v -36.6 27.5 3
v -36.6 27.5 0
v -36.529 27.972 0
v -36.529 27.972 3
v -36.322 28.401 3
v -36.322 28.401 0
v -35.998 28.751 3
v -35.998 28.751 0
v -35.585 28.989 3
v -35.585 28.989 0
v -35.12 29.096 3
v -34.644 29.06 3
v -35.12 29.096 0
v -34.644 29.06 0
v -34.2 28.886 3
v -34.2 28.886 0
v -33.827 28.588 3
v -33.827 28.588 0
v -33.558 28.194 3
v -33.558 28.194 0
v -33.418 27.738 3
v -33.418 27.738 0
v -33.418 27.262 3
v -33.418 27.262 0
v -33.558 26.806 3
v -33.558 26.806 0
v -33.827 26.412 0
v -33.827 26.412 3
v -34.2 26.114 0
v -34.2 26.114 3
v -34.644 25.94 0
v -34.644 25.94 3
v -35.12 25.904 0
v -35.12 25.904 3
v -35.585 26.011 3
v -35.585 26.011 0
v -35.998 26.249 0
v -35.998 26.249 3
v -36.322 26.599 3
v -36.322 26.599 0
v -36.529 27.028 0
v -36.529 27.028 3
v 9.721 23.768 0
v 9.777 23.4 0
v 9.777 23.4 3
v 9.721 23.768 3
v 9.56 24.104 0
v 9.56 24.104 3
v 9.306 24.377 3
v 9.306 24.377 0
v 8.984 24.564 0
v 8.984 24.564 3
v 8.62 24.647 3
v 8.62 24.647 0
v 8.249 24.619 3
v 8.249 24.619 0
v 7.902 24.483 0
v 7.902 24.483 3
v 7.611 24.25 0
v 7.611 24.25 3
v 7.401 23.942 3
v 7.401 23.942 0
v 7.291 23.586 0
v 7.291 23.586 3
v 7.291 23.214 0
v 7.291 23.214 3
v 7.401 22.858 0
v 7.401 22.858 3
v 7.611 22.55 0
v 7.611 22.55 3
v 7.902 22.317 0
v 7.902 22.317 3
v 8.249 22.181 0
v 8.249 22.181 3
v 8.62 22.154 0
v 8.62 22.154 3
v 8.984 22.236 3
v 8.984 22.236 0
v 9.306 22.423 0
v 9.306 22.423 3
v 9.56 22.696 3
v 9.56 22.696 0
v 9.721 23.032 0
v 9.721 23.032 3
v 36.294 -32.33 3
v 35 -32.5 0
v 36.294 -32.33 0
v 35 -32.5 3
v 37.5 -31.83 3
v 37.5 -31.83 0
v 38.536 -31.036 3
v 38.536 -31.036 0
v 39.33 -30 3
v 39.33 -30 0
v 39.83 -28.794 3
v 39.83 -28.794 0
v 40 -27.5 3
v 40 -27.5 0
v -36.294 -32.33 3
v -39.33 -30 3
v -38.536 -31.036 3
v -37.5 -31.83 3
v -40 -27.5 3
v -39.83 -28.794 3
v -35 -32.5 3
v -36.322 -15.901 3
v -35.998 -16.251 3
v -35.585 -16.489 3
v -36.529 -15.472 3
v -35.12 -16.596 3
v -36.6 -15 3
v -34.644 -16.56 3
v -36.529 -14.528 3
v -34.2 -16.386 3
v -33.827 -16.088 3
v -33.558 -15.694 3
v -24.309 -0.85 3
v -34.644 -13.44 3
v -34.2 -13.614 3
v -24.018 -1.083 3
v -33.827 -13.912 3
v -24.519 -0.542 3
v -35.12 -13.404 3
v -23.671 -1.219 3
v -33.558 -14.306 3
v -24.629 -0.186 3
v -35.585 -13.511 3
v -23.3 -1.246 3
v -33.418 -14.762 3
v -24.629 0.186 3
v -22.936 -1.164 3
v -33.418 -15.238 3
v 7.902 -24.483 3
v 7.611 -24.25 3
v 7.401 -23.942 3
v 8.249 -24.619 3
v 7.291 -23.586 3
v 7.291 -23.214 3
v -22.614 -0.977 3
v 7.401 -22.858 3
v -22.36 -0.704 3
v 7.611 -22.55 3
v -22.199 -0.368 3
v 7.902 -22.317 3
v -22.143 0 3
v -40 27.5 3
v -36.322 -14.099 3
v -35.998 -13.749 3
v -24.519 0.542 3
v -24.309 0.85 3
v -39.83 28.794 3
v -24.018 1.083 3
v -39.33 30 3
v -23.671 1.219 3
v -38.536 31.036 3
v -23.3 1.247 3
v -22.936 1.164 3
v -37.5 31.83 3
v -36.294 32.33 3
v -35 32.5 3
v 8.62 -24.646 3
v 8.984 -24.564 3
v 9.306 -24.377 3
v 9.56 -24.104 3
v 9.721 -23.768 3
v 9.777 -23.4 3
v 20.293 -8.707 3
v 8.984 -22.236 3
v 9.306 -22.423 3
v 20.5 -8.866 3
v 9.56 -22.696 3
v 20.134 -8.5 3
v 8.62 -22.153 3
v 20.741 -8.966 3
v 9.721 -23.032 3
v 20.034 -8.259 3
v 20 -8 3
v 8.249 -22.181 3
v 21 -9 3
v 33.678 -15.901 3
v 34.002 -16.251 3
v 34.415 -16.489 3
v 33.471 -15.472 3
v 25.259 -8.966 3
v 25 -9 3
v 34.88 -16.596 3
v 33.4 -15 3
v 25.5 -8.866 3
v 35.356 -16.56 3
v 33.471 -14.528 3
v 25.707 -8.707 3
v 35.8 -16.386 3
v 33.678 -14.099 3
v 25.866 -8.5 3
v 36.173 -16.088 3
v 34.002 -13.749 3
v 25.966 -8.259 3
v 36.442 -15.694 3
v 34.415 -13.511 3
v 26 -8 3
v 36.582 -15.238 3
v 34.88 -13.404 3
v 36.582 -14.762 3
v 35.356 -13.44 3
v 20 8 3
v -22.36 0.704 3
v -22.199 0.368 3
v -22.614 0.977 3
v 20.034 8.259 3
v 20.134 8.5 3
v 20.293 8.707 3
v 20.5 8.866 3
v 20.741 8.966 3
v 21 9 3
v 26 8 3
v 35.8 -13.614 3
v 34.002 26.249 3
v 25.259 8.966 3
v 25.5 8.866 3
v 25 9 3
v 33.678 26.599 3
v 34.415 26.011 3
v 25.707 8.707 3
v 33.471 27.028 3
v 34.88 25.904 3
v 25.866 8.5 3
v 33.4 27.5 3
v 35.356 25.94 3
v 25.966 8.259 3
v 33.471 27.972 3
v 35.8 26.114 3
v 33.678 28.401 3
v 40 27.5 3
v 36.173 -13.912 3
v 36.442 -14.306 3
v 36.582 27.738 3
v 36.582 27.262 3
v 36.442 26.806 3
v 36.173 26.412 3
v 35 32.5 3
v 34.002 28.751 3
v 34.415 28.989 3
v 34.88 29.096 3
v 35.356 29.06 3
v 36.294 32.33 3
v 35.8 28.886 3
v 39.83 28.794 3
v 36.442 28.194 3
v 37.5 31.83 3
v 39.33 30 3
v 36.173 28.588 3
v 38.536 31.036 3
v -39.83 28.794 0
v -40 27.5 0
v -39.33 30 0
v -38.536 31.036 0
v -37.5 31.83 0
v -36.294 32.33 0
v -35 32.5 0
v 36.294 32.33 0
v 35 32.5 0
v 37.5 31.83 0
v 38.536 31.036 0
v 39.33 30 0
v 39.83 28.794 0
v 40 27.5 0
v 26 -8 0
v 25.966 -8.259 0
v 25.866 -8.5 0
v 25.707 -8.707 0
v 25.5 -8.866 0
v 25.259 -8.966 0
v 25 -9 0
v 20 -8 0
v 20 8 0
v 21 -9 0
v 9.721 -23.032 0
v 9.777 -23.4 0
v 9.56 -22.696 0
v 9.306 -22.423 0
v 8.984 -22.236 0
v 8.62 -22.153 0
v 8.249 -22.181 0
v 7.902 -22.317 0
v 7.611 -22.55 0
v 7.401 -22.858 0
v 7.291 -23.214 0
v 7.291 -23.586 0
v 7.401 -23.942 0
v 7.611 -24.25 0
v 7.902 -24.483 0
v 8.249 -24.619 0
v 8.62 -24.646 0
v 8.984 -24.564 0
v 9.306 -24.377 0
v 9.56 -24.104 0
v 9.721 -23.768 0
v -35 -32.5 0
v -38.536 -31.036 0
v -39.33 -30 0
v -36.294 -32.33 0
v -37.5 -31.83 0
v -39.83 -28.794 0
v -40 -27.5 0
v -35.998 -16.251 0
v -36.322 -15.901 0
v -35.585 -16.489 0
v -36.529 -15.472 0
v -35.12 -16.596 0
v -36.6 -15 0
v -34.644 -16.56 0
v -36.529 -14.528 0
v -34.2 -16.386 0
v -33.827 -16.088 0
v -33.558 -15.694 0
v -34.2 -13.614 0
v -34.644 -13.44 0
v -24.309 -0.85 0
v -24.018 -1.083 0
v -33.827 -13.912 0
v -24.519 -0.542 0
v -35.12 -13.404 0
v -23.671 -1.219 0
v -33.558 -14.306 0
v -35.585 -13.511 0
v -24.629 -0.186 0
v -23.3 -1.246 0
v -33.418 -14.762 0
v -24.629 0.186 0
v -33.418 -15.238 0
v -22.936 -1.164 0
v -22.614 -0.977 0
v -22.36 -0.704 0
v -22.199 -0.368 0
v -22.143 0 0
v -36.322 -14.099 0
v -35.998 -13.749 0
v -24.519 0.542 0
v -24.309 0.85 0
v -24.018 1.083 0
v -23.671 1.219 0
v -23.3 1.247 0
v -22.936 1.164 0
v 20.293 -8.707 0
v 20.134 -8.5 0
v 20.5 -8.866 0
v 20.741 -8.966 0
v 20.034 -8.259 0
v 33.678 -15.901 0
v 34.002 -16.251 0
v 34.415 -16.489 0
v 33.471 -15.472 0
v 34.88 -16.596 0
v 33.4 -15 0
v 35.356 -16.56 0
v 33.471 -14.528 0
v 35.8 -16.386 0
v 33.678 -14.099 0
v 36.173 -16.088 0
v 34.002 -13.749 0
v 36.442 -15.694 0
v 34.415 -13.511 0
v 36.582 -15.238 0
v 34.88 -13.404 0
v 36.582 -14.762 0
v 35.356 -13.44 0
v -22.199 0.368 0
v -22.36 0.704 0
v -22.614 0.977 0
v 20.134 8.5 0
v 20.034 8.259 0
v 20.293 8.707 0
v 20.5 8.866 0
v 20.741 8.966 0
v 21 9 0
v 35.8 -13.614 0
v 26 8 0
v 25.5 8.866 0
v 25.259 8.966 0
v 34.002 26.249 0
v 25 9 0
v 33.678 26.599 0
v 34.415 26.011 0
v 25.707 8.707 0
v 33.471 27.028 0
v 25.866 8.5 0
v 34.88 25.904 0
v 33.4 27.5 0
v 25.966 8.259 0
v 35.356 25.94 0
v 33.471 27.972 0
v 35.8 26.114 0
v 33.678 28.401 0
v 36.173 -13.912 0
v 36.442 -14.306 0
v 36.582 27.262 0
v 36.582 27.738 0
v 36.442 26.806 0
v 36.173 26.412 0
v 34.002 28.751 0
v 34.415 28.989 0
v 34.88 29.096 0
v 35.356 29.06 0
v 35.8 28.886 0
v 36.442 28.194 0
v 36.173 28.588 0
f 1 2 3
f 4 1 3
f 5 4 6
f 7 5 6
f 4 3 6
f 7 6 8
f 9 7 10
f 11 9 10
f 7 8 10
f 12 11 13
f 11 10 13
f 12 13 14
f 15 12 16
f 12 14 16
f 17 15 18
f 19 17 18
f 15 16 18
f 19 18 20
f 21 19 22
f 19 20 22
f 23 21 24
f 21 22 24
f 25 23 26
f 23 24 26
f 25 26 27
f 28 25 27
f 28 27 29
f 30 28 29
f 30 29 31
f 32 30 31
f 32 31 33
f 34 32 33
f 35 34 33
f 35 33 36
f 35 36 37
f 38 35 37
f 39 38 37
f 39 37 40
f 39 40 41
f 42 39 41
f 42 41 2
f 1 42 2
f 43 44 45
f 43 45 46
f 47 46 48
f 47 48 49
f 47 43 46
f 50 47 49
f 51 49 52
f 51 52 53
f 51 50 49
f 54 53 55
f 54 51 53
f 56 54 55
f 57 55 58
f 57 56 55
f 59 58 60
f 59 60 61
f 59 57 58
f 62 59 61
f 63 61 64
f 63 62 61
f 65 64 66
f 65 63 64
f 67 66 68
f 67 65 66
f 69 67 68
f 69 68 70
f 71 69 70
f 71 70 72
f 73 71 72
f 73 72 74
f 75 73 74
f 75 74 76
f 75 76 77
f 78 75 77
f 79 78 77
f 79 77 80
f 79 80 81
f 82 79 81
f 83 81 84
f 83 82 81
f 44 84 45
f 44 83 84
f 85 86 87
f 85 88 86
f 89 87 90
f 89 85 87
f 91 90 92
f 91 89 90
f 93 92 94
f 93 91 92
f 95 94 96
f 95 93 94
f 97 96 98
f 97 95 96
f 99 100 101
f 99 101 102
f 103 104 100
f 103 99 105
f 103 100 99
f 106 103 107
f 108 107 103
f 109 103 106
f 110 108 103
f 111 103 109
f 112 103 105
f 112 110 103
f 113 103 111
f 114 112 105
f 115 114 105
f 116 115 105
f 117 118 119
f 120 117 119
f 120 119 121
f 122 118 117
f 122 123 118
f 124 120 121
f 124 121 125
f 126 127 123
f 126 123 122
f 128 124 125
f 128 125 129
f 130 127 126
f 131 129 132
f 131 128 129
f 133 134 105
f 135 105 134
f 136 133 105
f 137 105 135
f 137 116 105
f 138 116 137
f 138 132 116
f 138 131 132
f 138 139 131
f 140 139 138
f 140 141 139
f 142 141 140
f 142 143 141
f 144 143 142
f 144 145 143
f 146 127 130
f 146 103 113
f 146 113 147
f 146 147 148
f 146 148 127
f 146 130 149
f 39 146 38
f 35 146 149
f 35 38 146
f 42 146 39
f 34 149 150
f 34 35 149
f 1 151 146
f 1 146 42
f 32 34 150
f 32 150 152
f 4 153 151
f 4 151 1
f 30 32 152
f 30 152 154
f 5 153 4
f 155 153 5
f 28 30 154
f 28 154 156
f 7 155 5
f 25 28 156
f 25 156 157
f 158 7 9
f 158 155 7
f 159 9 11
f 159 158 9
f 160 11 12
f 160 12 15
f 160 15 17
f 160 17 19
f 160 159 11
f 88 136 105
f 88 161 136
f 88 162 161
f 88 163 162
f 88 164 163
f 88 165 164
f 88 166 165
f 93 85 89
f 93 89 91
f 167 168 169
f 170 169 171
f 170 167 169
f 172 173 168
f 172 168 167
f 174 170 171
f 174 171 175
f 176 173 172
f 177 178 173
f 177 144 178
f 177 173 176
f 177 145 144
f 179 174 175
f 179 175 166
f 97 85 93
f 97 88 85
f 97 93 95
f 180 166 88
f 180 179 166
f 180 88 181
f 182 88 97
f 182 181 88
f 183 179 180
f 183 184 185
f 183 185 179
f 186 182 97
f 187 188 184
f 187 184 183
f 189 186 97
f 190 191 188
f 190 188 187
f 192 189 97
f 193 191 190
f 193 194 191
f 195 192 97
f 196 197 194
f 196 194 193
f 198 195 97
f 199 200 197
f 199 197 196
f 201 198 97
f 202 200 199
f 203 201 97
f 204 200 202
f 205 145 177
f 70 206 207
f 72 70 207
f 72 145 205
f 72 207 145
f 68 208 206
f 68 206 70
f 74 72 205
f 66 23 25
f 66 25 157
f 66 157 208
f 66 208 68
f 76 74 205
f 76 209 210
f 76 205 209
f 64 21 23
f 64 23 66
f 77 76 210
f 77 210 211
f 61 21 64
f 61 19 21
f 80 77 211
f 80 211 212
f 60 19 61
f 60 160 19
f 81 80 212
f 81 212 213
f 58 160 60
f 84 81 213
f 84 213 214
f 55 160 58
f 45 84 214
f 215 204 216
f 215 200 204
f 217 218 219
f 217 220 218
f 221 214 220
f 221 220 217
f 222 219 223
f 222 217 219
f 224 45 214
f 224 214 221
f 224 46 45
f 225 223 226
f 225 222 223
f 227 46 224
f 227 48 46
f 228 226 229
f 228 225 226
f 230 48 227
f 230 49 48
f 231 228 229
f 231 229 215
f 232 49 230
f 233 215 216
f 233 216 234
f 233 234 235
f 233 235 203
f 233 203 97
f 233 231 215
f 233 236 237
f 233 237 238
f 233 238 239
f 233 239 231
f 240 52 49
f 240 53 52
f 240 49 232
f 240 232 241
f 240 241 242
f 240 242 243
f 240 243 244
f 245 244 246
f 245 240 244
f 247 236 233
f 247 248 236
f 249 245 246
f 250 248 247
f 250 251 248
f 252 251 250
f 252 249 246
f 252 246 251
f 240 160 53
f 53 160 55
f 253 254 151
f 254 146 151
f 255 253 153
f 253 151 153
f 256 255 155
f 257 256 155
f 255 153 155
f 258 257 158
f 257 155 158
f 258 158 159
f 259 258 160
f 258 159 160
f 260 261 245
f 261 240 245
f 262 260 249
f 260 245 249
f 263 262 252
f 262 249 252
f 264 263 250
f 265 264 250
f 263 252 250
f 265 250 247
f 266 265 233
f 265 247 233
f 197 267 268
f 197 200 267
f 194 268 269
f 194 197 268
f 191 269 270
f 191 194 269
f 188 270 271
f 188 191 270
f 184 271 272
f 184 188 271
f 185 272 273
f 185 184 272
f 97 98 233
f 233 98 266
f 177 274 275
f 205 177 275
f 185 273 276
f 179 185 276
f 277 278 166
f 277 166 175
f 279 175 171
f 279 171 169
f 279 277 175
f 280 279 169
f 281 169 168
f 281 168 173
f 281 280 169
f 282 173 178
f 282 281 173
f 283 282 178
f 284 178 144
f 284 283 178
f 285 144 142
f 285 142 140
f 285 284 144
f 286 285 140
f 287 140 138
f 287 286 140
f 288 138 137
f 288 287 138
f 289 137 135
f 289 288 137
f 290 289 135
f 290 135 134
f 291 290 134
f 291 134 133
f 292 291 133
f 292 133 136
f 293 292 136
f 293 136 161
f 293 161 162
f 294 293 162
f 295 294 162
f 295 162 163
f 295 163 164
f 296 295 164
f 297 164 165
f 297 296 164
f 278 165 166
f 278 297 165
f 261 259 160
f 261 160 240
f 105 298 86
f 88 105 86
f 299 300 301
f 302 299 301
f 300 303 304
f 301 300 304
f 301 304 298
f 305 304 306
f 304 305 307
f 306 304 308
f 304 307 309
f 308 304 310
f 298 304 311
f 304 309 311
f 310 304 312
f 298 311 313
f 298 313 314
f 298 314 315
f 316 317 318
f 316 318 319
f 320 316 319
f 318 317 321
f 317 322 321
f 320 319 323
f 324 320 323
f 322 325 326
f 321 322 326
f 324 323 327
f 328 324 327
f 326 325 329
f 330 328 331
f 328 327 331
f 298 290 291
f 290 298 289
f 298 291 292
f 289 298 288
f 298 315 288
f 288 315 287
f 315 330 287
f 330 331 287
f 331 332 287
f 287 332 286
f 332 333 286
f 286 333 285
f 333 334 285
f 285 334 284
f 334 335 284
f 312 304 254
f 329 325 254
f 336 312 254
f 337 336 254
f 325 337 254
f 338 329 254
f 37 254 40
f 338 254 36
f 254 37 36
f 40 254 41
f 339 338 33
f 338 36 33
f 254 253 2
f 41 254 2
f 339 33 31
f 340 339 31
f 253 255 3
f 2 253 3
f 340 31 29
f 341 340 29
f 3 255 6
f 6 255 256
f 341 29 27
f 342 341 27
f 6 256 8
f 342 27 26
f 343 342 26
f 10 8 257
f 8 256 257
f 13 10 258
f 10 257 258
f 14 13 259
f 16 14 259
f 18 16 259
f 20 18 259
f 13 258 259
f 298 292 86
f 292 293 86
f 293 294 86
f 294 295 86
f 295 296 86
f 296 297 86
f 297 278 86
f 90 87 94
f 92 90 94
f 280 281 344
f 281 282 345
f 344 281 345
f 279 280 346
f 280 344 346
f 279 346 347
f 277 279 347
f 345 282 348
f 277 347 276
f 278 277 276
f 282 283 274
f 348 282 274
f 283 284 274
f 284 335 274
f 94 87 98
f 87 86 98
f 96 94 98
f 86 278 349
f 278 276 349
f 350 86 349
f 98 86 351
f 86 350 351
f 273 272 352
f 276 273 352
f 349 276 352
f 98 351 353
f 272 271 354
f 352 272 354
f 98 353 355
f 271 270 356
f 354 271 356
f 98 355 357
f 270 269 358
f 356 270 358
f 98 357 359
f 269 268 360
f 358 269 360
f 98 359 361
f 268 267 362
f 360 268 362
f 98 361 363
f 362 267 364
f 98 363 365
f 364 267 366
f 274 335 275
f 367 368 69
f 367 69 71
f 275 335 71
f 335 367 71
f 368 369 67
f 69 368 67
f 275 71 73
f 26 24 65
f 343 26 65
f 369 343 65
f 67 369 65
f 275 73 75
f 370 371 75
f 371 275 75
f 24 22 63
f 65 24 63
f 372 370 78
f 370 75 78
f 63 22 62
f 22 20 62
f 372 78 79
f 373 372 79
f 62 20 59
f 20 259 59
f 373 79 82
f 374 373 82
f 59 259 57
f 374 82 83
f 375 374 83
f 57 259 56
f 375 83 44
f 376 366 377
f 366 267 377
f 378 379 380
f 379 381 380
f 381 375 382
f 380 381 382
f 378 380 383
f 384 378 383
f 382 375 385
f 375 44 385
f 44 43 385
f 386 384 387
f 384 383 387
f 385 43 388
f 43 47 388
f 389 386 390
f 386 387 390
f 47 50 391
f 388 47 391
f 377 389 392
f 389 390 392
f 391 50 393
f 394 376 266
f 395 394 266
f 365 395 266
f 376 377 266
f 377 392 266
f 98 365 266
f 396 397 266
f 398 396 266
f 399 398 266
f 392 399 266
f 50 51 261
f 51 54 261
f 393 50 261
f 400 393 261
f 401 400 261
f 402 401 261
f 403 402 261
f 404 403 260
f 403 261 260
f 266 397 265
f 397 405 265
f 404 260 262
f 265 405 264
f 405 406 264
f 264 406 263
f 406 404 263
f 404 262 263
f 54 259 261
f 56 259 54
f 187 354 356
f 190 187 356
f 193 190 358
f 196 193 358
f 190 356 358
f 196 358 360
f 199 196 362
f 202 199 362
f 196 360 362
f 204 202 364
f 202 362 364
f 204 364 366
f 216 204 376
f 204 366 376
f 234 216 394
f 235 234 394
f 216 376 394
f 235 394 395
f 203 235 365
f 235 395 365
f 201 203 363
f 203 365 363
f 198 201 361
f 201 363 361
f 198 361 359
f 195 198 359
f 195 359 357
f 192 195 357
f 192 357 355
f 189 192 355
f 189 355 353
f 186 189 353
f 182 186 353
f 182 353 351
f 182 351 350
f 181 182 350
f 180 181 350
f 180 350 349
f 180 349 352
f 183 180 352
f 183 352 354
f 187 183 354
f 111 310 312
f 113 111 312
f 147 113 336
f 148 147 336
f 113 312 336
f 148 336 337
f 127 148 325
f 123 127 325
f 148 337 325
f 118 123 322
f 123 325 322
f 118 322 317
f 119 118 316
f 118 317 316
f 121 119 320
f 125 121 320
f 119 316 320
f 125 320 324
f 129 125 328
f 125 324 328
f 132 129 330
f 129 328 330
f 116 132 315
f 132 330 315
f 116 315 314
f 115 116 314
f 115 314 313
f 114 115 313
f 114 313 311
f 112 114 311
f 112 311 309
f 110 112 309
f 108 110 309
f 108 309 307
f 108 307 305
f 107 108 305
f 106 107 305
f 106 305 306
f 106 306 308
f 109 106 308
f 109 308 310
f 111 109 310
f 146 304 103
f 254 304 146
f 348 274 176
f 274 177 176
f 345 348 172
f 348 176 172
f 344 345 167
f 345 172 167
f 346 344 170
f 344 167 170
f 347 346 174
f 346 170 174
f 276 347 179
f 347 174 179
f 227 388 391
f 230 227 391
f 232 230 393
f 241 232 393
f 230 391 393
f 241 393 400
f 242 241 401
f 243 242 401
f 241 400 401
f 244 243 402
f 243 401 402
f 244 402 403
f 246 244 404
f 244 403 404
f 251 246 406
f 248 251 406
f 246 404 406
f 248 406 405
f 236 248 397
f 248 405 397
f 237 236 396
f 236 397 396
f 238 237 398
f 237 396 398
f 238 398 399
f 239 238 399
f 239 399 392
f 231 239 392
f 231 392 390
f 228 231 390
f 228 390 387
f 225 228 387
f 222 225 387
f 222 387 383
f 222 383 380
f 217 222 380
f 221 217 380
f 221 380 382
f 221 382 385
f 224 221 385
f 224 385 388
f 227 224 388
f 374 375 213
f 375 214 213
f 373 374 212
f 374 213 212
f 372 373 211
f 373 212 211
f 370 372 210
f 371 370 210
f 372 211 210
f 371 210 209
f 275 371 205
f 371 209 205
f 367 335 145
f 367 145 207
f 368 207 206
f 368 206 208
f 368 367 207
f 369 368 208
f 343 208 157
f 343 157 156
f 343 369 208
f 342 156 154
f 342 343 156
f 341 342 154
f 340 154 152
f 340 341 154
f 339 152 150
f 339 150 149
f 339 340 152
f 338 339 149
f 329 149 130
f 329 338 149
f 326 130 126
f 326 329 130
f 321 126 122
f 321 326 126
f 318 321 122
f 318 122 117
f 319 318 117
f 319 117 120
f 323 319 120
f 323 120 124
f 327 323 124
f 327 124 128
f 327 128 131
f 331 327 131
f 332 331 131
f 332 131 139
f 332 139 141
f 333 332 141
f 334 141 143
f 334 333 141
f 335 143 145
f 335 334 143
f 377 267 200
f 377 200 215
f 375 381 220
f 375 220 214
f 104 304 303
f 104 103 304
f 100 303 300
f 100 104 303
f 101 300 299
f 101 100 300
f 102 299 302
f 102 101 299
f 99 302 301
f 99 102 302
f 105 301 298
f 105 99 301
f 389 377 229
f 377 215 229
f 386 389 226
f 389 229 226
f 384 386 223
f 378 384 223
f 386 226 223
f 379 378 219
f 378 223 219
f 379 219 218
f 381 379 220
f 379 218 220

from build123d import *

# Parameters (mm, degrees)
SKETCH1_W           = 80
SKETCH1_H           = 65
SKETCH1_R           = 1.25
BOSS_EXTRUDE1_DEPTH = 3
FILLET1_R           = 5
SKETCH2_R           = 1.6
CUT_EXTRUDE1_DEPTH  = 52.626059311
SKETCH4_W           = 6
SKETCH4_H           = 18
CUT_EXTRUDE2_DEPTH  = 52.626059311
FILLET2_R           = 1


with BuildPart() as part:
    # Sketch1 → Boss-Extrude1 (new body)
    with BuildSketch(Plane.XY):
        Rectangle(SKETCH1_W, SKETCH1_H)
        with Locations((8.526833703, 23.400005474)):
            Circle(SKETCH1_R, mode=Mode.SUBTRACT)
        with Locations((8.526833703, -23.399994526)):
            Circle(SKETCH1_R, mode=Mode.SUBTRACT)
        with Locations((-23.393166297, 5.474e-06)):
            Circle(SKETCH1_R, mode=Mode.SUBTRACT)
    extrude(amount=BOSS_EXTRUDE1_DEPTH)

    # Fillet1
    fillet1_edges = [part.edges().sort_by_distance(p)[0] for p in [
        (-40, 32.5, 1.5),
        (40, 32.5, 1.5),
        (40, -32.5, 1.5),
        (-40, -32.5, 1.5),
    ]]
    fillet(fillet1_edges, radius=FILLET1_R)

    # Sketch2 → Cut-Extrude1 (cut, through all)
    with BuildSketch(Plane(origin=(0, 0, 0), x_dir=(-1, 0, 0), z_dir=(0, 0, -1))):
        with Locations((-35, 27.5)):
            Circle(SKETCH2_R)
        with Locations((-35, -15)):
            Circle(SKETCH2_R)
        with Locations((35, 27.5)):
            Circle(SKETCH2_R)
        with Locations((35, -15)):
            Circle(SKETCH2_R)
    extrude(amount=-CUT_EXTRUDE1_DEPTH, mode=Mode.SUBTRACT)

    # Sketch4 → Cut-Extrude2 (cut, through all)
    with BuildSketch(Plane(origin=(0, 0, 0), x_dir=(-1, 0, 0), z_dir=(0, 0, -1))):
        with Locations((-23, 0)):
            Rectangle(SKETCH4_W, SKETCH4_H)
    extrude(amount=-CUT_EXTRUDE2_DEPTH, mode=Mode.SUBTRACT)

    # Fillet2
    fillet2_edges = [part.edges().sort_by_distance(p)[0] for p in [
        (26, -9, 1.5),
        (26, 9, 1.5),
        (20, 9, 1.5),
        (20, -9, 1.5),
    ]]
    fillet(fillet2_edges, radius=FILLET2_R)


solid = part.part
